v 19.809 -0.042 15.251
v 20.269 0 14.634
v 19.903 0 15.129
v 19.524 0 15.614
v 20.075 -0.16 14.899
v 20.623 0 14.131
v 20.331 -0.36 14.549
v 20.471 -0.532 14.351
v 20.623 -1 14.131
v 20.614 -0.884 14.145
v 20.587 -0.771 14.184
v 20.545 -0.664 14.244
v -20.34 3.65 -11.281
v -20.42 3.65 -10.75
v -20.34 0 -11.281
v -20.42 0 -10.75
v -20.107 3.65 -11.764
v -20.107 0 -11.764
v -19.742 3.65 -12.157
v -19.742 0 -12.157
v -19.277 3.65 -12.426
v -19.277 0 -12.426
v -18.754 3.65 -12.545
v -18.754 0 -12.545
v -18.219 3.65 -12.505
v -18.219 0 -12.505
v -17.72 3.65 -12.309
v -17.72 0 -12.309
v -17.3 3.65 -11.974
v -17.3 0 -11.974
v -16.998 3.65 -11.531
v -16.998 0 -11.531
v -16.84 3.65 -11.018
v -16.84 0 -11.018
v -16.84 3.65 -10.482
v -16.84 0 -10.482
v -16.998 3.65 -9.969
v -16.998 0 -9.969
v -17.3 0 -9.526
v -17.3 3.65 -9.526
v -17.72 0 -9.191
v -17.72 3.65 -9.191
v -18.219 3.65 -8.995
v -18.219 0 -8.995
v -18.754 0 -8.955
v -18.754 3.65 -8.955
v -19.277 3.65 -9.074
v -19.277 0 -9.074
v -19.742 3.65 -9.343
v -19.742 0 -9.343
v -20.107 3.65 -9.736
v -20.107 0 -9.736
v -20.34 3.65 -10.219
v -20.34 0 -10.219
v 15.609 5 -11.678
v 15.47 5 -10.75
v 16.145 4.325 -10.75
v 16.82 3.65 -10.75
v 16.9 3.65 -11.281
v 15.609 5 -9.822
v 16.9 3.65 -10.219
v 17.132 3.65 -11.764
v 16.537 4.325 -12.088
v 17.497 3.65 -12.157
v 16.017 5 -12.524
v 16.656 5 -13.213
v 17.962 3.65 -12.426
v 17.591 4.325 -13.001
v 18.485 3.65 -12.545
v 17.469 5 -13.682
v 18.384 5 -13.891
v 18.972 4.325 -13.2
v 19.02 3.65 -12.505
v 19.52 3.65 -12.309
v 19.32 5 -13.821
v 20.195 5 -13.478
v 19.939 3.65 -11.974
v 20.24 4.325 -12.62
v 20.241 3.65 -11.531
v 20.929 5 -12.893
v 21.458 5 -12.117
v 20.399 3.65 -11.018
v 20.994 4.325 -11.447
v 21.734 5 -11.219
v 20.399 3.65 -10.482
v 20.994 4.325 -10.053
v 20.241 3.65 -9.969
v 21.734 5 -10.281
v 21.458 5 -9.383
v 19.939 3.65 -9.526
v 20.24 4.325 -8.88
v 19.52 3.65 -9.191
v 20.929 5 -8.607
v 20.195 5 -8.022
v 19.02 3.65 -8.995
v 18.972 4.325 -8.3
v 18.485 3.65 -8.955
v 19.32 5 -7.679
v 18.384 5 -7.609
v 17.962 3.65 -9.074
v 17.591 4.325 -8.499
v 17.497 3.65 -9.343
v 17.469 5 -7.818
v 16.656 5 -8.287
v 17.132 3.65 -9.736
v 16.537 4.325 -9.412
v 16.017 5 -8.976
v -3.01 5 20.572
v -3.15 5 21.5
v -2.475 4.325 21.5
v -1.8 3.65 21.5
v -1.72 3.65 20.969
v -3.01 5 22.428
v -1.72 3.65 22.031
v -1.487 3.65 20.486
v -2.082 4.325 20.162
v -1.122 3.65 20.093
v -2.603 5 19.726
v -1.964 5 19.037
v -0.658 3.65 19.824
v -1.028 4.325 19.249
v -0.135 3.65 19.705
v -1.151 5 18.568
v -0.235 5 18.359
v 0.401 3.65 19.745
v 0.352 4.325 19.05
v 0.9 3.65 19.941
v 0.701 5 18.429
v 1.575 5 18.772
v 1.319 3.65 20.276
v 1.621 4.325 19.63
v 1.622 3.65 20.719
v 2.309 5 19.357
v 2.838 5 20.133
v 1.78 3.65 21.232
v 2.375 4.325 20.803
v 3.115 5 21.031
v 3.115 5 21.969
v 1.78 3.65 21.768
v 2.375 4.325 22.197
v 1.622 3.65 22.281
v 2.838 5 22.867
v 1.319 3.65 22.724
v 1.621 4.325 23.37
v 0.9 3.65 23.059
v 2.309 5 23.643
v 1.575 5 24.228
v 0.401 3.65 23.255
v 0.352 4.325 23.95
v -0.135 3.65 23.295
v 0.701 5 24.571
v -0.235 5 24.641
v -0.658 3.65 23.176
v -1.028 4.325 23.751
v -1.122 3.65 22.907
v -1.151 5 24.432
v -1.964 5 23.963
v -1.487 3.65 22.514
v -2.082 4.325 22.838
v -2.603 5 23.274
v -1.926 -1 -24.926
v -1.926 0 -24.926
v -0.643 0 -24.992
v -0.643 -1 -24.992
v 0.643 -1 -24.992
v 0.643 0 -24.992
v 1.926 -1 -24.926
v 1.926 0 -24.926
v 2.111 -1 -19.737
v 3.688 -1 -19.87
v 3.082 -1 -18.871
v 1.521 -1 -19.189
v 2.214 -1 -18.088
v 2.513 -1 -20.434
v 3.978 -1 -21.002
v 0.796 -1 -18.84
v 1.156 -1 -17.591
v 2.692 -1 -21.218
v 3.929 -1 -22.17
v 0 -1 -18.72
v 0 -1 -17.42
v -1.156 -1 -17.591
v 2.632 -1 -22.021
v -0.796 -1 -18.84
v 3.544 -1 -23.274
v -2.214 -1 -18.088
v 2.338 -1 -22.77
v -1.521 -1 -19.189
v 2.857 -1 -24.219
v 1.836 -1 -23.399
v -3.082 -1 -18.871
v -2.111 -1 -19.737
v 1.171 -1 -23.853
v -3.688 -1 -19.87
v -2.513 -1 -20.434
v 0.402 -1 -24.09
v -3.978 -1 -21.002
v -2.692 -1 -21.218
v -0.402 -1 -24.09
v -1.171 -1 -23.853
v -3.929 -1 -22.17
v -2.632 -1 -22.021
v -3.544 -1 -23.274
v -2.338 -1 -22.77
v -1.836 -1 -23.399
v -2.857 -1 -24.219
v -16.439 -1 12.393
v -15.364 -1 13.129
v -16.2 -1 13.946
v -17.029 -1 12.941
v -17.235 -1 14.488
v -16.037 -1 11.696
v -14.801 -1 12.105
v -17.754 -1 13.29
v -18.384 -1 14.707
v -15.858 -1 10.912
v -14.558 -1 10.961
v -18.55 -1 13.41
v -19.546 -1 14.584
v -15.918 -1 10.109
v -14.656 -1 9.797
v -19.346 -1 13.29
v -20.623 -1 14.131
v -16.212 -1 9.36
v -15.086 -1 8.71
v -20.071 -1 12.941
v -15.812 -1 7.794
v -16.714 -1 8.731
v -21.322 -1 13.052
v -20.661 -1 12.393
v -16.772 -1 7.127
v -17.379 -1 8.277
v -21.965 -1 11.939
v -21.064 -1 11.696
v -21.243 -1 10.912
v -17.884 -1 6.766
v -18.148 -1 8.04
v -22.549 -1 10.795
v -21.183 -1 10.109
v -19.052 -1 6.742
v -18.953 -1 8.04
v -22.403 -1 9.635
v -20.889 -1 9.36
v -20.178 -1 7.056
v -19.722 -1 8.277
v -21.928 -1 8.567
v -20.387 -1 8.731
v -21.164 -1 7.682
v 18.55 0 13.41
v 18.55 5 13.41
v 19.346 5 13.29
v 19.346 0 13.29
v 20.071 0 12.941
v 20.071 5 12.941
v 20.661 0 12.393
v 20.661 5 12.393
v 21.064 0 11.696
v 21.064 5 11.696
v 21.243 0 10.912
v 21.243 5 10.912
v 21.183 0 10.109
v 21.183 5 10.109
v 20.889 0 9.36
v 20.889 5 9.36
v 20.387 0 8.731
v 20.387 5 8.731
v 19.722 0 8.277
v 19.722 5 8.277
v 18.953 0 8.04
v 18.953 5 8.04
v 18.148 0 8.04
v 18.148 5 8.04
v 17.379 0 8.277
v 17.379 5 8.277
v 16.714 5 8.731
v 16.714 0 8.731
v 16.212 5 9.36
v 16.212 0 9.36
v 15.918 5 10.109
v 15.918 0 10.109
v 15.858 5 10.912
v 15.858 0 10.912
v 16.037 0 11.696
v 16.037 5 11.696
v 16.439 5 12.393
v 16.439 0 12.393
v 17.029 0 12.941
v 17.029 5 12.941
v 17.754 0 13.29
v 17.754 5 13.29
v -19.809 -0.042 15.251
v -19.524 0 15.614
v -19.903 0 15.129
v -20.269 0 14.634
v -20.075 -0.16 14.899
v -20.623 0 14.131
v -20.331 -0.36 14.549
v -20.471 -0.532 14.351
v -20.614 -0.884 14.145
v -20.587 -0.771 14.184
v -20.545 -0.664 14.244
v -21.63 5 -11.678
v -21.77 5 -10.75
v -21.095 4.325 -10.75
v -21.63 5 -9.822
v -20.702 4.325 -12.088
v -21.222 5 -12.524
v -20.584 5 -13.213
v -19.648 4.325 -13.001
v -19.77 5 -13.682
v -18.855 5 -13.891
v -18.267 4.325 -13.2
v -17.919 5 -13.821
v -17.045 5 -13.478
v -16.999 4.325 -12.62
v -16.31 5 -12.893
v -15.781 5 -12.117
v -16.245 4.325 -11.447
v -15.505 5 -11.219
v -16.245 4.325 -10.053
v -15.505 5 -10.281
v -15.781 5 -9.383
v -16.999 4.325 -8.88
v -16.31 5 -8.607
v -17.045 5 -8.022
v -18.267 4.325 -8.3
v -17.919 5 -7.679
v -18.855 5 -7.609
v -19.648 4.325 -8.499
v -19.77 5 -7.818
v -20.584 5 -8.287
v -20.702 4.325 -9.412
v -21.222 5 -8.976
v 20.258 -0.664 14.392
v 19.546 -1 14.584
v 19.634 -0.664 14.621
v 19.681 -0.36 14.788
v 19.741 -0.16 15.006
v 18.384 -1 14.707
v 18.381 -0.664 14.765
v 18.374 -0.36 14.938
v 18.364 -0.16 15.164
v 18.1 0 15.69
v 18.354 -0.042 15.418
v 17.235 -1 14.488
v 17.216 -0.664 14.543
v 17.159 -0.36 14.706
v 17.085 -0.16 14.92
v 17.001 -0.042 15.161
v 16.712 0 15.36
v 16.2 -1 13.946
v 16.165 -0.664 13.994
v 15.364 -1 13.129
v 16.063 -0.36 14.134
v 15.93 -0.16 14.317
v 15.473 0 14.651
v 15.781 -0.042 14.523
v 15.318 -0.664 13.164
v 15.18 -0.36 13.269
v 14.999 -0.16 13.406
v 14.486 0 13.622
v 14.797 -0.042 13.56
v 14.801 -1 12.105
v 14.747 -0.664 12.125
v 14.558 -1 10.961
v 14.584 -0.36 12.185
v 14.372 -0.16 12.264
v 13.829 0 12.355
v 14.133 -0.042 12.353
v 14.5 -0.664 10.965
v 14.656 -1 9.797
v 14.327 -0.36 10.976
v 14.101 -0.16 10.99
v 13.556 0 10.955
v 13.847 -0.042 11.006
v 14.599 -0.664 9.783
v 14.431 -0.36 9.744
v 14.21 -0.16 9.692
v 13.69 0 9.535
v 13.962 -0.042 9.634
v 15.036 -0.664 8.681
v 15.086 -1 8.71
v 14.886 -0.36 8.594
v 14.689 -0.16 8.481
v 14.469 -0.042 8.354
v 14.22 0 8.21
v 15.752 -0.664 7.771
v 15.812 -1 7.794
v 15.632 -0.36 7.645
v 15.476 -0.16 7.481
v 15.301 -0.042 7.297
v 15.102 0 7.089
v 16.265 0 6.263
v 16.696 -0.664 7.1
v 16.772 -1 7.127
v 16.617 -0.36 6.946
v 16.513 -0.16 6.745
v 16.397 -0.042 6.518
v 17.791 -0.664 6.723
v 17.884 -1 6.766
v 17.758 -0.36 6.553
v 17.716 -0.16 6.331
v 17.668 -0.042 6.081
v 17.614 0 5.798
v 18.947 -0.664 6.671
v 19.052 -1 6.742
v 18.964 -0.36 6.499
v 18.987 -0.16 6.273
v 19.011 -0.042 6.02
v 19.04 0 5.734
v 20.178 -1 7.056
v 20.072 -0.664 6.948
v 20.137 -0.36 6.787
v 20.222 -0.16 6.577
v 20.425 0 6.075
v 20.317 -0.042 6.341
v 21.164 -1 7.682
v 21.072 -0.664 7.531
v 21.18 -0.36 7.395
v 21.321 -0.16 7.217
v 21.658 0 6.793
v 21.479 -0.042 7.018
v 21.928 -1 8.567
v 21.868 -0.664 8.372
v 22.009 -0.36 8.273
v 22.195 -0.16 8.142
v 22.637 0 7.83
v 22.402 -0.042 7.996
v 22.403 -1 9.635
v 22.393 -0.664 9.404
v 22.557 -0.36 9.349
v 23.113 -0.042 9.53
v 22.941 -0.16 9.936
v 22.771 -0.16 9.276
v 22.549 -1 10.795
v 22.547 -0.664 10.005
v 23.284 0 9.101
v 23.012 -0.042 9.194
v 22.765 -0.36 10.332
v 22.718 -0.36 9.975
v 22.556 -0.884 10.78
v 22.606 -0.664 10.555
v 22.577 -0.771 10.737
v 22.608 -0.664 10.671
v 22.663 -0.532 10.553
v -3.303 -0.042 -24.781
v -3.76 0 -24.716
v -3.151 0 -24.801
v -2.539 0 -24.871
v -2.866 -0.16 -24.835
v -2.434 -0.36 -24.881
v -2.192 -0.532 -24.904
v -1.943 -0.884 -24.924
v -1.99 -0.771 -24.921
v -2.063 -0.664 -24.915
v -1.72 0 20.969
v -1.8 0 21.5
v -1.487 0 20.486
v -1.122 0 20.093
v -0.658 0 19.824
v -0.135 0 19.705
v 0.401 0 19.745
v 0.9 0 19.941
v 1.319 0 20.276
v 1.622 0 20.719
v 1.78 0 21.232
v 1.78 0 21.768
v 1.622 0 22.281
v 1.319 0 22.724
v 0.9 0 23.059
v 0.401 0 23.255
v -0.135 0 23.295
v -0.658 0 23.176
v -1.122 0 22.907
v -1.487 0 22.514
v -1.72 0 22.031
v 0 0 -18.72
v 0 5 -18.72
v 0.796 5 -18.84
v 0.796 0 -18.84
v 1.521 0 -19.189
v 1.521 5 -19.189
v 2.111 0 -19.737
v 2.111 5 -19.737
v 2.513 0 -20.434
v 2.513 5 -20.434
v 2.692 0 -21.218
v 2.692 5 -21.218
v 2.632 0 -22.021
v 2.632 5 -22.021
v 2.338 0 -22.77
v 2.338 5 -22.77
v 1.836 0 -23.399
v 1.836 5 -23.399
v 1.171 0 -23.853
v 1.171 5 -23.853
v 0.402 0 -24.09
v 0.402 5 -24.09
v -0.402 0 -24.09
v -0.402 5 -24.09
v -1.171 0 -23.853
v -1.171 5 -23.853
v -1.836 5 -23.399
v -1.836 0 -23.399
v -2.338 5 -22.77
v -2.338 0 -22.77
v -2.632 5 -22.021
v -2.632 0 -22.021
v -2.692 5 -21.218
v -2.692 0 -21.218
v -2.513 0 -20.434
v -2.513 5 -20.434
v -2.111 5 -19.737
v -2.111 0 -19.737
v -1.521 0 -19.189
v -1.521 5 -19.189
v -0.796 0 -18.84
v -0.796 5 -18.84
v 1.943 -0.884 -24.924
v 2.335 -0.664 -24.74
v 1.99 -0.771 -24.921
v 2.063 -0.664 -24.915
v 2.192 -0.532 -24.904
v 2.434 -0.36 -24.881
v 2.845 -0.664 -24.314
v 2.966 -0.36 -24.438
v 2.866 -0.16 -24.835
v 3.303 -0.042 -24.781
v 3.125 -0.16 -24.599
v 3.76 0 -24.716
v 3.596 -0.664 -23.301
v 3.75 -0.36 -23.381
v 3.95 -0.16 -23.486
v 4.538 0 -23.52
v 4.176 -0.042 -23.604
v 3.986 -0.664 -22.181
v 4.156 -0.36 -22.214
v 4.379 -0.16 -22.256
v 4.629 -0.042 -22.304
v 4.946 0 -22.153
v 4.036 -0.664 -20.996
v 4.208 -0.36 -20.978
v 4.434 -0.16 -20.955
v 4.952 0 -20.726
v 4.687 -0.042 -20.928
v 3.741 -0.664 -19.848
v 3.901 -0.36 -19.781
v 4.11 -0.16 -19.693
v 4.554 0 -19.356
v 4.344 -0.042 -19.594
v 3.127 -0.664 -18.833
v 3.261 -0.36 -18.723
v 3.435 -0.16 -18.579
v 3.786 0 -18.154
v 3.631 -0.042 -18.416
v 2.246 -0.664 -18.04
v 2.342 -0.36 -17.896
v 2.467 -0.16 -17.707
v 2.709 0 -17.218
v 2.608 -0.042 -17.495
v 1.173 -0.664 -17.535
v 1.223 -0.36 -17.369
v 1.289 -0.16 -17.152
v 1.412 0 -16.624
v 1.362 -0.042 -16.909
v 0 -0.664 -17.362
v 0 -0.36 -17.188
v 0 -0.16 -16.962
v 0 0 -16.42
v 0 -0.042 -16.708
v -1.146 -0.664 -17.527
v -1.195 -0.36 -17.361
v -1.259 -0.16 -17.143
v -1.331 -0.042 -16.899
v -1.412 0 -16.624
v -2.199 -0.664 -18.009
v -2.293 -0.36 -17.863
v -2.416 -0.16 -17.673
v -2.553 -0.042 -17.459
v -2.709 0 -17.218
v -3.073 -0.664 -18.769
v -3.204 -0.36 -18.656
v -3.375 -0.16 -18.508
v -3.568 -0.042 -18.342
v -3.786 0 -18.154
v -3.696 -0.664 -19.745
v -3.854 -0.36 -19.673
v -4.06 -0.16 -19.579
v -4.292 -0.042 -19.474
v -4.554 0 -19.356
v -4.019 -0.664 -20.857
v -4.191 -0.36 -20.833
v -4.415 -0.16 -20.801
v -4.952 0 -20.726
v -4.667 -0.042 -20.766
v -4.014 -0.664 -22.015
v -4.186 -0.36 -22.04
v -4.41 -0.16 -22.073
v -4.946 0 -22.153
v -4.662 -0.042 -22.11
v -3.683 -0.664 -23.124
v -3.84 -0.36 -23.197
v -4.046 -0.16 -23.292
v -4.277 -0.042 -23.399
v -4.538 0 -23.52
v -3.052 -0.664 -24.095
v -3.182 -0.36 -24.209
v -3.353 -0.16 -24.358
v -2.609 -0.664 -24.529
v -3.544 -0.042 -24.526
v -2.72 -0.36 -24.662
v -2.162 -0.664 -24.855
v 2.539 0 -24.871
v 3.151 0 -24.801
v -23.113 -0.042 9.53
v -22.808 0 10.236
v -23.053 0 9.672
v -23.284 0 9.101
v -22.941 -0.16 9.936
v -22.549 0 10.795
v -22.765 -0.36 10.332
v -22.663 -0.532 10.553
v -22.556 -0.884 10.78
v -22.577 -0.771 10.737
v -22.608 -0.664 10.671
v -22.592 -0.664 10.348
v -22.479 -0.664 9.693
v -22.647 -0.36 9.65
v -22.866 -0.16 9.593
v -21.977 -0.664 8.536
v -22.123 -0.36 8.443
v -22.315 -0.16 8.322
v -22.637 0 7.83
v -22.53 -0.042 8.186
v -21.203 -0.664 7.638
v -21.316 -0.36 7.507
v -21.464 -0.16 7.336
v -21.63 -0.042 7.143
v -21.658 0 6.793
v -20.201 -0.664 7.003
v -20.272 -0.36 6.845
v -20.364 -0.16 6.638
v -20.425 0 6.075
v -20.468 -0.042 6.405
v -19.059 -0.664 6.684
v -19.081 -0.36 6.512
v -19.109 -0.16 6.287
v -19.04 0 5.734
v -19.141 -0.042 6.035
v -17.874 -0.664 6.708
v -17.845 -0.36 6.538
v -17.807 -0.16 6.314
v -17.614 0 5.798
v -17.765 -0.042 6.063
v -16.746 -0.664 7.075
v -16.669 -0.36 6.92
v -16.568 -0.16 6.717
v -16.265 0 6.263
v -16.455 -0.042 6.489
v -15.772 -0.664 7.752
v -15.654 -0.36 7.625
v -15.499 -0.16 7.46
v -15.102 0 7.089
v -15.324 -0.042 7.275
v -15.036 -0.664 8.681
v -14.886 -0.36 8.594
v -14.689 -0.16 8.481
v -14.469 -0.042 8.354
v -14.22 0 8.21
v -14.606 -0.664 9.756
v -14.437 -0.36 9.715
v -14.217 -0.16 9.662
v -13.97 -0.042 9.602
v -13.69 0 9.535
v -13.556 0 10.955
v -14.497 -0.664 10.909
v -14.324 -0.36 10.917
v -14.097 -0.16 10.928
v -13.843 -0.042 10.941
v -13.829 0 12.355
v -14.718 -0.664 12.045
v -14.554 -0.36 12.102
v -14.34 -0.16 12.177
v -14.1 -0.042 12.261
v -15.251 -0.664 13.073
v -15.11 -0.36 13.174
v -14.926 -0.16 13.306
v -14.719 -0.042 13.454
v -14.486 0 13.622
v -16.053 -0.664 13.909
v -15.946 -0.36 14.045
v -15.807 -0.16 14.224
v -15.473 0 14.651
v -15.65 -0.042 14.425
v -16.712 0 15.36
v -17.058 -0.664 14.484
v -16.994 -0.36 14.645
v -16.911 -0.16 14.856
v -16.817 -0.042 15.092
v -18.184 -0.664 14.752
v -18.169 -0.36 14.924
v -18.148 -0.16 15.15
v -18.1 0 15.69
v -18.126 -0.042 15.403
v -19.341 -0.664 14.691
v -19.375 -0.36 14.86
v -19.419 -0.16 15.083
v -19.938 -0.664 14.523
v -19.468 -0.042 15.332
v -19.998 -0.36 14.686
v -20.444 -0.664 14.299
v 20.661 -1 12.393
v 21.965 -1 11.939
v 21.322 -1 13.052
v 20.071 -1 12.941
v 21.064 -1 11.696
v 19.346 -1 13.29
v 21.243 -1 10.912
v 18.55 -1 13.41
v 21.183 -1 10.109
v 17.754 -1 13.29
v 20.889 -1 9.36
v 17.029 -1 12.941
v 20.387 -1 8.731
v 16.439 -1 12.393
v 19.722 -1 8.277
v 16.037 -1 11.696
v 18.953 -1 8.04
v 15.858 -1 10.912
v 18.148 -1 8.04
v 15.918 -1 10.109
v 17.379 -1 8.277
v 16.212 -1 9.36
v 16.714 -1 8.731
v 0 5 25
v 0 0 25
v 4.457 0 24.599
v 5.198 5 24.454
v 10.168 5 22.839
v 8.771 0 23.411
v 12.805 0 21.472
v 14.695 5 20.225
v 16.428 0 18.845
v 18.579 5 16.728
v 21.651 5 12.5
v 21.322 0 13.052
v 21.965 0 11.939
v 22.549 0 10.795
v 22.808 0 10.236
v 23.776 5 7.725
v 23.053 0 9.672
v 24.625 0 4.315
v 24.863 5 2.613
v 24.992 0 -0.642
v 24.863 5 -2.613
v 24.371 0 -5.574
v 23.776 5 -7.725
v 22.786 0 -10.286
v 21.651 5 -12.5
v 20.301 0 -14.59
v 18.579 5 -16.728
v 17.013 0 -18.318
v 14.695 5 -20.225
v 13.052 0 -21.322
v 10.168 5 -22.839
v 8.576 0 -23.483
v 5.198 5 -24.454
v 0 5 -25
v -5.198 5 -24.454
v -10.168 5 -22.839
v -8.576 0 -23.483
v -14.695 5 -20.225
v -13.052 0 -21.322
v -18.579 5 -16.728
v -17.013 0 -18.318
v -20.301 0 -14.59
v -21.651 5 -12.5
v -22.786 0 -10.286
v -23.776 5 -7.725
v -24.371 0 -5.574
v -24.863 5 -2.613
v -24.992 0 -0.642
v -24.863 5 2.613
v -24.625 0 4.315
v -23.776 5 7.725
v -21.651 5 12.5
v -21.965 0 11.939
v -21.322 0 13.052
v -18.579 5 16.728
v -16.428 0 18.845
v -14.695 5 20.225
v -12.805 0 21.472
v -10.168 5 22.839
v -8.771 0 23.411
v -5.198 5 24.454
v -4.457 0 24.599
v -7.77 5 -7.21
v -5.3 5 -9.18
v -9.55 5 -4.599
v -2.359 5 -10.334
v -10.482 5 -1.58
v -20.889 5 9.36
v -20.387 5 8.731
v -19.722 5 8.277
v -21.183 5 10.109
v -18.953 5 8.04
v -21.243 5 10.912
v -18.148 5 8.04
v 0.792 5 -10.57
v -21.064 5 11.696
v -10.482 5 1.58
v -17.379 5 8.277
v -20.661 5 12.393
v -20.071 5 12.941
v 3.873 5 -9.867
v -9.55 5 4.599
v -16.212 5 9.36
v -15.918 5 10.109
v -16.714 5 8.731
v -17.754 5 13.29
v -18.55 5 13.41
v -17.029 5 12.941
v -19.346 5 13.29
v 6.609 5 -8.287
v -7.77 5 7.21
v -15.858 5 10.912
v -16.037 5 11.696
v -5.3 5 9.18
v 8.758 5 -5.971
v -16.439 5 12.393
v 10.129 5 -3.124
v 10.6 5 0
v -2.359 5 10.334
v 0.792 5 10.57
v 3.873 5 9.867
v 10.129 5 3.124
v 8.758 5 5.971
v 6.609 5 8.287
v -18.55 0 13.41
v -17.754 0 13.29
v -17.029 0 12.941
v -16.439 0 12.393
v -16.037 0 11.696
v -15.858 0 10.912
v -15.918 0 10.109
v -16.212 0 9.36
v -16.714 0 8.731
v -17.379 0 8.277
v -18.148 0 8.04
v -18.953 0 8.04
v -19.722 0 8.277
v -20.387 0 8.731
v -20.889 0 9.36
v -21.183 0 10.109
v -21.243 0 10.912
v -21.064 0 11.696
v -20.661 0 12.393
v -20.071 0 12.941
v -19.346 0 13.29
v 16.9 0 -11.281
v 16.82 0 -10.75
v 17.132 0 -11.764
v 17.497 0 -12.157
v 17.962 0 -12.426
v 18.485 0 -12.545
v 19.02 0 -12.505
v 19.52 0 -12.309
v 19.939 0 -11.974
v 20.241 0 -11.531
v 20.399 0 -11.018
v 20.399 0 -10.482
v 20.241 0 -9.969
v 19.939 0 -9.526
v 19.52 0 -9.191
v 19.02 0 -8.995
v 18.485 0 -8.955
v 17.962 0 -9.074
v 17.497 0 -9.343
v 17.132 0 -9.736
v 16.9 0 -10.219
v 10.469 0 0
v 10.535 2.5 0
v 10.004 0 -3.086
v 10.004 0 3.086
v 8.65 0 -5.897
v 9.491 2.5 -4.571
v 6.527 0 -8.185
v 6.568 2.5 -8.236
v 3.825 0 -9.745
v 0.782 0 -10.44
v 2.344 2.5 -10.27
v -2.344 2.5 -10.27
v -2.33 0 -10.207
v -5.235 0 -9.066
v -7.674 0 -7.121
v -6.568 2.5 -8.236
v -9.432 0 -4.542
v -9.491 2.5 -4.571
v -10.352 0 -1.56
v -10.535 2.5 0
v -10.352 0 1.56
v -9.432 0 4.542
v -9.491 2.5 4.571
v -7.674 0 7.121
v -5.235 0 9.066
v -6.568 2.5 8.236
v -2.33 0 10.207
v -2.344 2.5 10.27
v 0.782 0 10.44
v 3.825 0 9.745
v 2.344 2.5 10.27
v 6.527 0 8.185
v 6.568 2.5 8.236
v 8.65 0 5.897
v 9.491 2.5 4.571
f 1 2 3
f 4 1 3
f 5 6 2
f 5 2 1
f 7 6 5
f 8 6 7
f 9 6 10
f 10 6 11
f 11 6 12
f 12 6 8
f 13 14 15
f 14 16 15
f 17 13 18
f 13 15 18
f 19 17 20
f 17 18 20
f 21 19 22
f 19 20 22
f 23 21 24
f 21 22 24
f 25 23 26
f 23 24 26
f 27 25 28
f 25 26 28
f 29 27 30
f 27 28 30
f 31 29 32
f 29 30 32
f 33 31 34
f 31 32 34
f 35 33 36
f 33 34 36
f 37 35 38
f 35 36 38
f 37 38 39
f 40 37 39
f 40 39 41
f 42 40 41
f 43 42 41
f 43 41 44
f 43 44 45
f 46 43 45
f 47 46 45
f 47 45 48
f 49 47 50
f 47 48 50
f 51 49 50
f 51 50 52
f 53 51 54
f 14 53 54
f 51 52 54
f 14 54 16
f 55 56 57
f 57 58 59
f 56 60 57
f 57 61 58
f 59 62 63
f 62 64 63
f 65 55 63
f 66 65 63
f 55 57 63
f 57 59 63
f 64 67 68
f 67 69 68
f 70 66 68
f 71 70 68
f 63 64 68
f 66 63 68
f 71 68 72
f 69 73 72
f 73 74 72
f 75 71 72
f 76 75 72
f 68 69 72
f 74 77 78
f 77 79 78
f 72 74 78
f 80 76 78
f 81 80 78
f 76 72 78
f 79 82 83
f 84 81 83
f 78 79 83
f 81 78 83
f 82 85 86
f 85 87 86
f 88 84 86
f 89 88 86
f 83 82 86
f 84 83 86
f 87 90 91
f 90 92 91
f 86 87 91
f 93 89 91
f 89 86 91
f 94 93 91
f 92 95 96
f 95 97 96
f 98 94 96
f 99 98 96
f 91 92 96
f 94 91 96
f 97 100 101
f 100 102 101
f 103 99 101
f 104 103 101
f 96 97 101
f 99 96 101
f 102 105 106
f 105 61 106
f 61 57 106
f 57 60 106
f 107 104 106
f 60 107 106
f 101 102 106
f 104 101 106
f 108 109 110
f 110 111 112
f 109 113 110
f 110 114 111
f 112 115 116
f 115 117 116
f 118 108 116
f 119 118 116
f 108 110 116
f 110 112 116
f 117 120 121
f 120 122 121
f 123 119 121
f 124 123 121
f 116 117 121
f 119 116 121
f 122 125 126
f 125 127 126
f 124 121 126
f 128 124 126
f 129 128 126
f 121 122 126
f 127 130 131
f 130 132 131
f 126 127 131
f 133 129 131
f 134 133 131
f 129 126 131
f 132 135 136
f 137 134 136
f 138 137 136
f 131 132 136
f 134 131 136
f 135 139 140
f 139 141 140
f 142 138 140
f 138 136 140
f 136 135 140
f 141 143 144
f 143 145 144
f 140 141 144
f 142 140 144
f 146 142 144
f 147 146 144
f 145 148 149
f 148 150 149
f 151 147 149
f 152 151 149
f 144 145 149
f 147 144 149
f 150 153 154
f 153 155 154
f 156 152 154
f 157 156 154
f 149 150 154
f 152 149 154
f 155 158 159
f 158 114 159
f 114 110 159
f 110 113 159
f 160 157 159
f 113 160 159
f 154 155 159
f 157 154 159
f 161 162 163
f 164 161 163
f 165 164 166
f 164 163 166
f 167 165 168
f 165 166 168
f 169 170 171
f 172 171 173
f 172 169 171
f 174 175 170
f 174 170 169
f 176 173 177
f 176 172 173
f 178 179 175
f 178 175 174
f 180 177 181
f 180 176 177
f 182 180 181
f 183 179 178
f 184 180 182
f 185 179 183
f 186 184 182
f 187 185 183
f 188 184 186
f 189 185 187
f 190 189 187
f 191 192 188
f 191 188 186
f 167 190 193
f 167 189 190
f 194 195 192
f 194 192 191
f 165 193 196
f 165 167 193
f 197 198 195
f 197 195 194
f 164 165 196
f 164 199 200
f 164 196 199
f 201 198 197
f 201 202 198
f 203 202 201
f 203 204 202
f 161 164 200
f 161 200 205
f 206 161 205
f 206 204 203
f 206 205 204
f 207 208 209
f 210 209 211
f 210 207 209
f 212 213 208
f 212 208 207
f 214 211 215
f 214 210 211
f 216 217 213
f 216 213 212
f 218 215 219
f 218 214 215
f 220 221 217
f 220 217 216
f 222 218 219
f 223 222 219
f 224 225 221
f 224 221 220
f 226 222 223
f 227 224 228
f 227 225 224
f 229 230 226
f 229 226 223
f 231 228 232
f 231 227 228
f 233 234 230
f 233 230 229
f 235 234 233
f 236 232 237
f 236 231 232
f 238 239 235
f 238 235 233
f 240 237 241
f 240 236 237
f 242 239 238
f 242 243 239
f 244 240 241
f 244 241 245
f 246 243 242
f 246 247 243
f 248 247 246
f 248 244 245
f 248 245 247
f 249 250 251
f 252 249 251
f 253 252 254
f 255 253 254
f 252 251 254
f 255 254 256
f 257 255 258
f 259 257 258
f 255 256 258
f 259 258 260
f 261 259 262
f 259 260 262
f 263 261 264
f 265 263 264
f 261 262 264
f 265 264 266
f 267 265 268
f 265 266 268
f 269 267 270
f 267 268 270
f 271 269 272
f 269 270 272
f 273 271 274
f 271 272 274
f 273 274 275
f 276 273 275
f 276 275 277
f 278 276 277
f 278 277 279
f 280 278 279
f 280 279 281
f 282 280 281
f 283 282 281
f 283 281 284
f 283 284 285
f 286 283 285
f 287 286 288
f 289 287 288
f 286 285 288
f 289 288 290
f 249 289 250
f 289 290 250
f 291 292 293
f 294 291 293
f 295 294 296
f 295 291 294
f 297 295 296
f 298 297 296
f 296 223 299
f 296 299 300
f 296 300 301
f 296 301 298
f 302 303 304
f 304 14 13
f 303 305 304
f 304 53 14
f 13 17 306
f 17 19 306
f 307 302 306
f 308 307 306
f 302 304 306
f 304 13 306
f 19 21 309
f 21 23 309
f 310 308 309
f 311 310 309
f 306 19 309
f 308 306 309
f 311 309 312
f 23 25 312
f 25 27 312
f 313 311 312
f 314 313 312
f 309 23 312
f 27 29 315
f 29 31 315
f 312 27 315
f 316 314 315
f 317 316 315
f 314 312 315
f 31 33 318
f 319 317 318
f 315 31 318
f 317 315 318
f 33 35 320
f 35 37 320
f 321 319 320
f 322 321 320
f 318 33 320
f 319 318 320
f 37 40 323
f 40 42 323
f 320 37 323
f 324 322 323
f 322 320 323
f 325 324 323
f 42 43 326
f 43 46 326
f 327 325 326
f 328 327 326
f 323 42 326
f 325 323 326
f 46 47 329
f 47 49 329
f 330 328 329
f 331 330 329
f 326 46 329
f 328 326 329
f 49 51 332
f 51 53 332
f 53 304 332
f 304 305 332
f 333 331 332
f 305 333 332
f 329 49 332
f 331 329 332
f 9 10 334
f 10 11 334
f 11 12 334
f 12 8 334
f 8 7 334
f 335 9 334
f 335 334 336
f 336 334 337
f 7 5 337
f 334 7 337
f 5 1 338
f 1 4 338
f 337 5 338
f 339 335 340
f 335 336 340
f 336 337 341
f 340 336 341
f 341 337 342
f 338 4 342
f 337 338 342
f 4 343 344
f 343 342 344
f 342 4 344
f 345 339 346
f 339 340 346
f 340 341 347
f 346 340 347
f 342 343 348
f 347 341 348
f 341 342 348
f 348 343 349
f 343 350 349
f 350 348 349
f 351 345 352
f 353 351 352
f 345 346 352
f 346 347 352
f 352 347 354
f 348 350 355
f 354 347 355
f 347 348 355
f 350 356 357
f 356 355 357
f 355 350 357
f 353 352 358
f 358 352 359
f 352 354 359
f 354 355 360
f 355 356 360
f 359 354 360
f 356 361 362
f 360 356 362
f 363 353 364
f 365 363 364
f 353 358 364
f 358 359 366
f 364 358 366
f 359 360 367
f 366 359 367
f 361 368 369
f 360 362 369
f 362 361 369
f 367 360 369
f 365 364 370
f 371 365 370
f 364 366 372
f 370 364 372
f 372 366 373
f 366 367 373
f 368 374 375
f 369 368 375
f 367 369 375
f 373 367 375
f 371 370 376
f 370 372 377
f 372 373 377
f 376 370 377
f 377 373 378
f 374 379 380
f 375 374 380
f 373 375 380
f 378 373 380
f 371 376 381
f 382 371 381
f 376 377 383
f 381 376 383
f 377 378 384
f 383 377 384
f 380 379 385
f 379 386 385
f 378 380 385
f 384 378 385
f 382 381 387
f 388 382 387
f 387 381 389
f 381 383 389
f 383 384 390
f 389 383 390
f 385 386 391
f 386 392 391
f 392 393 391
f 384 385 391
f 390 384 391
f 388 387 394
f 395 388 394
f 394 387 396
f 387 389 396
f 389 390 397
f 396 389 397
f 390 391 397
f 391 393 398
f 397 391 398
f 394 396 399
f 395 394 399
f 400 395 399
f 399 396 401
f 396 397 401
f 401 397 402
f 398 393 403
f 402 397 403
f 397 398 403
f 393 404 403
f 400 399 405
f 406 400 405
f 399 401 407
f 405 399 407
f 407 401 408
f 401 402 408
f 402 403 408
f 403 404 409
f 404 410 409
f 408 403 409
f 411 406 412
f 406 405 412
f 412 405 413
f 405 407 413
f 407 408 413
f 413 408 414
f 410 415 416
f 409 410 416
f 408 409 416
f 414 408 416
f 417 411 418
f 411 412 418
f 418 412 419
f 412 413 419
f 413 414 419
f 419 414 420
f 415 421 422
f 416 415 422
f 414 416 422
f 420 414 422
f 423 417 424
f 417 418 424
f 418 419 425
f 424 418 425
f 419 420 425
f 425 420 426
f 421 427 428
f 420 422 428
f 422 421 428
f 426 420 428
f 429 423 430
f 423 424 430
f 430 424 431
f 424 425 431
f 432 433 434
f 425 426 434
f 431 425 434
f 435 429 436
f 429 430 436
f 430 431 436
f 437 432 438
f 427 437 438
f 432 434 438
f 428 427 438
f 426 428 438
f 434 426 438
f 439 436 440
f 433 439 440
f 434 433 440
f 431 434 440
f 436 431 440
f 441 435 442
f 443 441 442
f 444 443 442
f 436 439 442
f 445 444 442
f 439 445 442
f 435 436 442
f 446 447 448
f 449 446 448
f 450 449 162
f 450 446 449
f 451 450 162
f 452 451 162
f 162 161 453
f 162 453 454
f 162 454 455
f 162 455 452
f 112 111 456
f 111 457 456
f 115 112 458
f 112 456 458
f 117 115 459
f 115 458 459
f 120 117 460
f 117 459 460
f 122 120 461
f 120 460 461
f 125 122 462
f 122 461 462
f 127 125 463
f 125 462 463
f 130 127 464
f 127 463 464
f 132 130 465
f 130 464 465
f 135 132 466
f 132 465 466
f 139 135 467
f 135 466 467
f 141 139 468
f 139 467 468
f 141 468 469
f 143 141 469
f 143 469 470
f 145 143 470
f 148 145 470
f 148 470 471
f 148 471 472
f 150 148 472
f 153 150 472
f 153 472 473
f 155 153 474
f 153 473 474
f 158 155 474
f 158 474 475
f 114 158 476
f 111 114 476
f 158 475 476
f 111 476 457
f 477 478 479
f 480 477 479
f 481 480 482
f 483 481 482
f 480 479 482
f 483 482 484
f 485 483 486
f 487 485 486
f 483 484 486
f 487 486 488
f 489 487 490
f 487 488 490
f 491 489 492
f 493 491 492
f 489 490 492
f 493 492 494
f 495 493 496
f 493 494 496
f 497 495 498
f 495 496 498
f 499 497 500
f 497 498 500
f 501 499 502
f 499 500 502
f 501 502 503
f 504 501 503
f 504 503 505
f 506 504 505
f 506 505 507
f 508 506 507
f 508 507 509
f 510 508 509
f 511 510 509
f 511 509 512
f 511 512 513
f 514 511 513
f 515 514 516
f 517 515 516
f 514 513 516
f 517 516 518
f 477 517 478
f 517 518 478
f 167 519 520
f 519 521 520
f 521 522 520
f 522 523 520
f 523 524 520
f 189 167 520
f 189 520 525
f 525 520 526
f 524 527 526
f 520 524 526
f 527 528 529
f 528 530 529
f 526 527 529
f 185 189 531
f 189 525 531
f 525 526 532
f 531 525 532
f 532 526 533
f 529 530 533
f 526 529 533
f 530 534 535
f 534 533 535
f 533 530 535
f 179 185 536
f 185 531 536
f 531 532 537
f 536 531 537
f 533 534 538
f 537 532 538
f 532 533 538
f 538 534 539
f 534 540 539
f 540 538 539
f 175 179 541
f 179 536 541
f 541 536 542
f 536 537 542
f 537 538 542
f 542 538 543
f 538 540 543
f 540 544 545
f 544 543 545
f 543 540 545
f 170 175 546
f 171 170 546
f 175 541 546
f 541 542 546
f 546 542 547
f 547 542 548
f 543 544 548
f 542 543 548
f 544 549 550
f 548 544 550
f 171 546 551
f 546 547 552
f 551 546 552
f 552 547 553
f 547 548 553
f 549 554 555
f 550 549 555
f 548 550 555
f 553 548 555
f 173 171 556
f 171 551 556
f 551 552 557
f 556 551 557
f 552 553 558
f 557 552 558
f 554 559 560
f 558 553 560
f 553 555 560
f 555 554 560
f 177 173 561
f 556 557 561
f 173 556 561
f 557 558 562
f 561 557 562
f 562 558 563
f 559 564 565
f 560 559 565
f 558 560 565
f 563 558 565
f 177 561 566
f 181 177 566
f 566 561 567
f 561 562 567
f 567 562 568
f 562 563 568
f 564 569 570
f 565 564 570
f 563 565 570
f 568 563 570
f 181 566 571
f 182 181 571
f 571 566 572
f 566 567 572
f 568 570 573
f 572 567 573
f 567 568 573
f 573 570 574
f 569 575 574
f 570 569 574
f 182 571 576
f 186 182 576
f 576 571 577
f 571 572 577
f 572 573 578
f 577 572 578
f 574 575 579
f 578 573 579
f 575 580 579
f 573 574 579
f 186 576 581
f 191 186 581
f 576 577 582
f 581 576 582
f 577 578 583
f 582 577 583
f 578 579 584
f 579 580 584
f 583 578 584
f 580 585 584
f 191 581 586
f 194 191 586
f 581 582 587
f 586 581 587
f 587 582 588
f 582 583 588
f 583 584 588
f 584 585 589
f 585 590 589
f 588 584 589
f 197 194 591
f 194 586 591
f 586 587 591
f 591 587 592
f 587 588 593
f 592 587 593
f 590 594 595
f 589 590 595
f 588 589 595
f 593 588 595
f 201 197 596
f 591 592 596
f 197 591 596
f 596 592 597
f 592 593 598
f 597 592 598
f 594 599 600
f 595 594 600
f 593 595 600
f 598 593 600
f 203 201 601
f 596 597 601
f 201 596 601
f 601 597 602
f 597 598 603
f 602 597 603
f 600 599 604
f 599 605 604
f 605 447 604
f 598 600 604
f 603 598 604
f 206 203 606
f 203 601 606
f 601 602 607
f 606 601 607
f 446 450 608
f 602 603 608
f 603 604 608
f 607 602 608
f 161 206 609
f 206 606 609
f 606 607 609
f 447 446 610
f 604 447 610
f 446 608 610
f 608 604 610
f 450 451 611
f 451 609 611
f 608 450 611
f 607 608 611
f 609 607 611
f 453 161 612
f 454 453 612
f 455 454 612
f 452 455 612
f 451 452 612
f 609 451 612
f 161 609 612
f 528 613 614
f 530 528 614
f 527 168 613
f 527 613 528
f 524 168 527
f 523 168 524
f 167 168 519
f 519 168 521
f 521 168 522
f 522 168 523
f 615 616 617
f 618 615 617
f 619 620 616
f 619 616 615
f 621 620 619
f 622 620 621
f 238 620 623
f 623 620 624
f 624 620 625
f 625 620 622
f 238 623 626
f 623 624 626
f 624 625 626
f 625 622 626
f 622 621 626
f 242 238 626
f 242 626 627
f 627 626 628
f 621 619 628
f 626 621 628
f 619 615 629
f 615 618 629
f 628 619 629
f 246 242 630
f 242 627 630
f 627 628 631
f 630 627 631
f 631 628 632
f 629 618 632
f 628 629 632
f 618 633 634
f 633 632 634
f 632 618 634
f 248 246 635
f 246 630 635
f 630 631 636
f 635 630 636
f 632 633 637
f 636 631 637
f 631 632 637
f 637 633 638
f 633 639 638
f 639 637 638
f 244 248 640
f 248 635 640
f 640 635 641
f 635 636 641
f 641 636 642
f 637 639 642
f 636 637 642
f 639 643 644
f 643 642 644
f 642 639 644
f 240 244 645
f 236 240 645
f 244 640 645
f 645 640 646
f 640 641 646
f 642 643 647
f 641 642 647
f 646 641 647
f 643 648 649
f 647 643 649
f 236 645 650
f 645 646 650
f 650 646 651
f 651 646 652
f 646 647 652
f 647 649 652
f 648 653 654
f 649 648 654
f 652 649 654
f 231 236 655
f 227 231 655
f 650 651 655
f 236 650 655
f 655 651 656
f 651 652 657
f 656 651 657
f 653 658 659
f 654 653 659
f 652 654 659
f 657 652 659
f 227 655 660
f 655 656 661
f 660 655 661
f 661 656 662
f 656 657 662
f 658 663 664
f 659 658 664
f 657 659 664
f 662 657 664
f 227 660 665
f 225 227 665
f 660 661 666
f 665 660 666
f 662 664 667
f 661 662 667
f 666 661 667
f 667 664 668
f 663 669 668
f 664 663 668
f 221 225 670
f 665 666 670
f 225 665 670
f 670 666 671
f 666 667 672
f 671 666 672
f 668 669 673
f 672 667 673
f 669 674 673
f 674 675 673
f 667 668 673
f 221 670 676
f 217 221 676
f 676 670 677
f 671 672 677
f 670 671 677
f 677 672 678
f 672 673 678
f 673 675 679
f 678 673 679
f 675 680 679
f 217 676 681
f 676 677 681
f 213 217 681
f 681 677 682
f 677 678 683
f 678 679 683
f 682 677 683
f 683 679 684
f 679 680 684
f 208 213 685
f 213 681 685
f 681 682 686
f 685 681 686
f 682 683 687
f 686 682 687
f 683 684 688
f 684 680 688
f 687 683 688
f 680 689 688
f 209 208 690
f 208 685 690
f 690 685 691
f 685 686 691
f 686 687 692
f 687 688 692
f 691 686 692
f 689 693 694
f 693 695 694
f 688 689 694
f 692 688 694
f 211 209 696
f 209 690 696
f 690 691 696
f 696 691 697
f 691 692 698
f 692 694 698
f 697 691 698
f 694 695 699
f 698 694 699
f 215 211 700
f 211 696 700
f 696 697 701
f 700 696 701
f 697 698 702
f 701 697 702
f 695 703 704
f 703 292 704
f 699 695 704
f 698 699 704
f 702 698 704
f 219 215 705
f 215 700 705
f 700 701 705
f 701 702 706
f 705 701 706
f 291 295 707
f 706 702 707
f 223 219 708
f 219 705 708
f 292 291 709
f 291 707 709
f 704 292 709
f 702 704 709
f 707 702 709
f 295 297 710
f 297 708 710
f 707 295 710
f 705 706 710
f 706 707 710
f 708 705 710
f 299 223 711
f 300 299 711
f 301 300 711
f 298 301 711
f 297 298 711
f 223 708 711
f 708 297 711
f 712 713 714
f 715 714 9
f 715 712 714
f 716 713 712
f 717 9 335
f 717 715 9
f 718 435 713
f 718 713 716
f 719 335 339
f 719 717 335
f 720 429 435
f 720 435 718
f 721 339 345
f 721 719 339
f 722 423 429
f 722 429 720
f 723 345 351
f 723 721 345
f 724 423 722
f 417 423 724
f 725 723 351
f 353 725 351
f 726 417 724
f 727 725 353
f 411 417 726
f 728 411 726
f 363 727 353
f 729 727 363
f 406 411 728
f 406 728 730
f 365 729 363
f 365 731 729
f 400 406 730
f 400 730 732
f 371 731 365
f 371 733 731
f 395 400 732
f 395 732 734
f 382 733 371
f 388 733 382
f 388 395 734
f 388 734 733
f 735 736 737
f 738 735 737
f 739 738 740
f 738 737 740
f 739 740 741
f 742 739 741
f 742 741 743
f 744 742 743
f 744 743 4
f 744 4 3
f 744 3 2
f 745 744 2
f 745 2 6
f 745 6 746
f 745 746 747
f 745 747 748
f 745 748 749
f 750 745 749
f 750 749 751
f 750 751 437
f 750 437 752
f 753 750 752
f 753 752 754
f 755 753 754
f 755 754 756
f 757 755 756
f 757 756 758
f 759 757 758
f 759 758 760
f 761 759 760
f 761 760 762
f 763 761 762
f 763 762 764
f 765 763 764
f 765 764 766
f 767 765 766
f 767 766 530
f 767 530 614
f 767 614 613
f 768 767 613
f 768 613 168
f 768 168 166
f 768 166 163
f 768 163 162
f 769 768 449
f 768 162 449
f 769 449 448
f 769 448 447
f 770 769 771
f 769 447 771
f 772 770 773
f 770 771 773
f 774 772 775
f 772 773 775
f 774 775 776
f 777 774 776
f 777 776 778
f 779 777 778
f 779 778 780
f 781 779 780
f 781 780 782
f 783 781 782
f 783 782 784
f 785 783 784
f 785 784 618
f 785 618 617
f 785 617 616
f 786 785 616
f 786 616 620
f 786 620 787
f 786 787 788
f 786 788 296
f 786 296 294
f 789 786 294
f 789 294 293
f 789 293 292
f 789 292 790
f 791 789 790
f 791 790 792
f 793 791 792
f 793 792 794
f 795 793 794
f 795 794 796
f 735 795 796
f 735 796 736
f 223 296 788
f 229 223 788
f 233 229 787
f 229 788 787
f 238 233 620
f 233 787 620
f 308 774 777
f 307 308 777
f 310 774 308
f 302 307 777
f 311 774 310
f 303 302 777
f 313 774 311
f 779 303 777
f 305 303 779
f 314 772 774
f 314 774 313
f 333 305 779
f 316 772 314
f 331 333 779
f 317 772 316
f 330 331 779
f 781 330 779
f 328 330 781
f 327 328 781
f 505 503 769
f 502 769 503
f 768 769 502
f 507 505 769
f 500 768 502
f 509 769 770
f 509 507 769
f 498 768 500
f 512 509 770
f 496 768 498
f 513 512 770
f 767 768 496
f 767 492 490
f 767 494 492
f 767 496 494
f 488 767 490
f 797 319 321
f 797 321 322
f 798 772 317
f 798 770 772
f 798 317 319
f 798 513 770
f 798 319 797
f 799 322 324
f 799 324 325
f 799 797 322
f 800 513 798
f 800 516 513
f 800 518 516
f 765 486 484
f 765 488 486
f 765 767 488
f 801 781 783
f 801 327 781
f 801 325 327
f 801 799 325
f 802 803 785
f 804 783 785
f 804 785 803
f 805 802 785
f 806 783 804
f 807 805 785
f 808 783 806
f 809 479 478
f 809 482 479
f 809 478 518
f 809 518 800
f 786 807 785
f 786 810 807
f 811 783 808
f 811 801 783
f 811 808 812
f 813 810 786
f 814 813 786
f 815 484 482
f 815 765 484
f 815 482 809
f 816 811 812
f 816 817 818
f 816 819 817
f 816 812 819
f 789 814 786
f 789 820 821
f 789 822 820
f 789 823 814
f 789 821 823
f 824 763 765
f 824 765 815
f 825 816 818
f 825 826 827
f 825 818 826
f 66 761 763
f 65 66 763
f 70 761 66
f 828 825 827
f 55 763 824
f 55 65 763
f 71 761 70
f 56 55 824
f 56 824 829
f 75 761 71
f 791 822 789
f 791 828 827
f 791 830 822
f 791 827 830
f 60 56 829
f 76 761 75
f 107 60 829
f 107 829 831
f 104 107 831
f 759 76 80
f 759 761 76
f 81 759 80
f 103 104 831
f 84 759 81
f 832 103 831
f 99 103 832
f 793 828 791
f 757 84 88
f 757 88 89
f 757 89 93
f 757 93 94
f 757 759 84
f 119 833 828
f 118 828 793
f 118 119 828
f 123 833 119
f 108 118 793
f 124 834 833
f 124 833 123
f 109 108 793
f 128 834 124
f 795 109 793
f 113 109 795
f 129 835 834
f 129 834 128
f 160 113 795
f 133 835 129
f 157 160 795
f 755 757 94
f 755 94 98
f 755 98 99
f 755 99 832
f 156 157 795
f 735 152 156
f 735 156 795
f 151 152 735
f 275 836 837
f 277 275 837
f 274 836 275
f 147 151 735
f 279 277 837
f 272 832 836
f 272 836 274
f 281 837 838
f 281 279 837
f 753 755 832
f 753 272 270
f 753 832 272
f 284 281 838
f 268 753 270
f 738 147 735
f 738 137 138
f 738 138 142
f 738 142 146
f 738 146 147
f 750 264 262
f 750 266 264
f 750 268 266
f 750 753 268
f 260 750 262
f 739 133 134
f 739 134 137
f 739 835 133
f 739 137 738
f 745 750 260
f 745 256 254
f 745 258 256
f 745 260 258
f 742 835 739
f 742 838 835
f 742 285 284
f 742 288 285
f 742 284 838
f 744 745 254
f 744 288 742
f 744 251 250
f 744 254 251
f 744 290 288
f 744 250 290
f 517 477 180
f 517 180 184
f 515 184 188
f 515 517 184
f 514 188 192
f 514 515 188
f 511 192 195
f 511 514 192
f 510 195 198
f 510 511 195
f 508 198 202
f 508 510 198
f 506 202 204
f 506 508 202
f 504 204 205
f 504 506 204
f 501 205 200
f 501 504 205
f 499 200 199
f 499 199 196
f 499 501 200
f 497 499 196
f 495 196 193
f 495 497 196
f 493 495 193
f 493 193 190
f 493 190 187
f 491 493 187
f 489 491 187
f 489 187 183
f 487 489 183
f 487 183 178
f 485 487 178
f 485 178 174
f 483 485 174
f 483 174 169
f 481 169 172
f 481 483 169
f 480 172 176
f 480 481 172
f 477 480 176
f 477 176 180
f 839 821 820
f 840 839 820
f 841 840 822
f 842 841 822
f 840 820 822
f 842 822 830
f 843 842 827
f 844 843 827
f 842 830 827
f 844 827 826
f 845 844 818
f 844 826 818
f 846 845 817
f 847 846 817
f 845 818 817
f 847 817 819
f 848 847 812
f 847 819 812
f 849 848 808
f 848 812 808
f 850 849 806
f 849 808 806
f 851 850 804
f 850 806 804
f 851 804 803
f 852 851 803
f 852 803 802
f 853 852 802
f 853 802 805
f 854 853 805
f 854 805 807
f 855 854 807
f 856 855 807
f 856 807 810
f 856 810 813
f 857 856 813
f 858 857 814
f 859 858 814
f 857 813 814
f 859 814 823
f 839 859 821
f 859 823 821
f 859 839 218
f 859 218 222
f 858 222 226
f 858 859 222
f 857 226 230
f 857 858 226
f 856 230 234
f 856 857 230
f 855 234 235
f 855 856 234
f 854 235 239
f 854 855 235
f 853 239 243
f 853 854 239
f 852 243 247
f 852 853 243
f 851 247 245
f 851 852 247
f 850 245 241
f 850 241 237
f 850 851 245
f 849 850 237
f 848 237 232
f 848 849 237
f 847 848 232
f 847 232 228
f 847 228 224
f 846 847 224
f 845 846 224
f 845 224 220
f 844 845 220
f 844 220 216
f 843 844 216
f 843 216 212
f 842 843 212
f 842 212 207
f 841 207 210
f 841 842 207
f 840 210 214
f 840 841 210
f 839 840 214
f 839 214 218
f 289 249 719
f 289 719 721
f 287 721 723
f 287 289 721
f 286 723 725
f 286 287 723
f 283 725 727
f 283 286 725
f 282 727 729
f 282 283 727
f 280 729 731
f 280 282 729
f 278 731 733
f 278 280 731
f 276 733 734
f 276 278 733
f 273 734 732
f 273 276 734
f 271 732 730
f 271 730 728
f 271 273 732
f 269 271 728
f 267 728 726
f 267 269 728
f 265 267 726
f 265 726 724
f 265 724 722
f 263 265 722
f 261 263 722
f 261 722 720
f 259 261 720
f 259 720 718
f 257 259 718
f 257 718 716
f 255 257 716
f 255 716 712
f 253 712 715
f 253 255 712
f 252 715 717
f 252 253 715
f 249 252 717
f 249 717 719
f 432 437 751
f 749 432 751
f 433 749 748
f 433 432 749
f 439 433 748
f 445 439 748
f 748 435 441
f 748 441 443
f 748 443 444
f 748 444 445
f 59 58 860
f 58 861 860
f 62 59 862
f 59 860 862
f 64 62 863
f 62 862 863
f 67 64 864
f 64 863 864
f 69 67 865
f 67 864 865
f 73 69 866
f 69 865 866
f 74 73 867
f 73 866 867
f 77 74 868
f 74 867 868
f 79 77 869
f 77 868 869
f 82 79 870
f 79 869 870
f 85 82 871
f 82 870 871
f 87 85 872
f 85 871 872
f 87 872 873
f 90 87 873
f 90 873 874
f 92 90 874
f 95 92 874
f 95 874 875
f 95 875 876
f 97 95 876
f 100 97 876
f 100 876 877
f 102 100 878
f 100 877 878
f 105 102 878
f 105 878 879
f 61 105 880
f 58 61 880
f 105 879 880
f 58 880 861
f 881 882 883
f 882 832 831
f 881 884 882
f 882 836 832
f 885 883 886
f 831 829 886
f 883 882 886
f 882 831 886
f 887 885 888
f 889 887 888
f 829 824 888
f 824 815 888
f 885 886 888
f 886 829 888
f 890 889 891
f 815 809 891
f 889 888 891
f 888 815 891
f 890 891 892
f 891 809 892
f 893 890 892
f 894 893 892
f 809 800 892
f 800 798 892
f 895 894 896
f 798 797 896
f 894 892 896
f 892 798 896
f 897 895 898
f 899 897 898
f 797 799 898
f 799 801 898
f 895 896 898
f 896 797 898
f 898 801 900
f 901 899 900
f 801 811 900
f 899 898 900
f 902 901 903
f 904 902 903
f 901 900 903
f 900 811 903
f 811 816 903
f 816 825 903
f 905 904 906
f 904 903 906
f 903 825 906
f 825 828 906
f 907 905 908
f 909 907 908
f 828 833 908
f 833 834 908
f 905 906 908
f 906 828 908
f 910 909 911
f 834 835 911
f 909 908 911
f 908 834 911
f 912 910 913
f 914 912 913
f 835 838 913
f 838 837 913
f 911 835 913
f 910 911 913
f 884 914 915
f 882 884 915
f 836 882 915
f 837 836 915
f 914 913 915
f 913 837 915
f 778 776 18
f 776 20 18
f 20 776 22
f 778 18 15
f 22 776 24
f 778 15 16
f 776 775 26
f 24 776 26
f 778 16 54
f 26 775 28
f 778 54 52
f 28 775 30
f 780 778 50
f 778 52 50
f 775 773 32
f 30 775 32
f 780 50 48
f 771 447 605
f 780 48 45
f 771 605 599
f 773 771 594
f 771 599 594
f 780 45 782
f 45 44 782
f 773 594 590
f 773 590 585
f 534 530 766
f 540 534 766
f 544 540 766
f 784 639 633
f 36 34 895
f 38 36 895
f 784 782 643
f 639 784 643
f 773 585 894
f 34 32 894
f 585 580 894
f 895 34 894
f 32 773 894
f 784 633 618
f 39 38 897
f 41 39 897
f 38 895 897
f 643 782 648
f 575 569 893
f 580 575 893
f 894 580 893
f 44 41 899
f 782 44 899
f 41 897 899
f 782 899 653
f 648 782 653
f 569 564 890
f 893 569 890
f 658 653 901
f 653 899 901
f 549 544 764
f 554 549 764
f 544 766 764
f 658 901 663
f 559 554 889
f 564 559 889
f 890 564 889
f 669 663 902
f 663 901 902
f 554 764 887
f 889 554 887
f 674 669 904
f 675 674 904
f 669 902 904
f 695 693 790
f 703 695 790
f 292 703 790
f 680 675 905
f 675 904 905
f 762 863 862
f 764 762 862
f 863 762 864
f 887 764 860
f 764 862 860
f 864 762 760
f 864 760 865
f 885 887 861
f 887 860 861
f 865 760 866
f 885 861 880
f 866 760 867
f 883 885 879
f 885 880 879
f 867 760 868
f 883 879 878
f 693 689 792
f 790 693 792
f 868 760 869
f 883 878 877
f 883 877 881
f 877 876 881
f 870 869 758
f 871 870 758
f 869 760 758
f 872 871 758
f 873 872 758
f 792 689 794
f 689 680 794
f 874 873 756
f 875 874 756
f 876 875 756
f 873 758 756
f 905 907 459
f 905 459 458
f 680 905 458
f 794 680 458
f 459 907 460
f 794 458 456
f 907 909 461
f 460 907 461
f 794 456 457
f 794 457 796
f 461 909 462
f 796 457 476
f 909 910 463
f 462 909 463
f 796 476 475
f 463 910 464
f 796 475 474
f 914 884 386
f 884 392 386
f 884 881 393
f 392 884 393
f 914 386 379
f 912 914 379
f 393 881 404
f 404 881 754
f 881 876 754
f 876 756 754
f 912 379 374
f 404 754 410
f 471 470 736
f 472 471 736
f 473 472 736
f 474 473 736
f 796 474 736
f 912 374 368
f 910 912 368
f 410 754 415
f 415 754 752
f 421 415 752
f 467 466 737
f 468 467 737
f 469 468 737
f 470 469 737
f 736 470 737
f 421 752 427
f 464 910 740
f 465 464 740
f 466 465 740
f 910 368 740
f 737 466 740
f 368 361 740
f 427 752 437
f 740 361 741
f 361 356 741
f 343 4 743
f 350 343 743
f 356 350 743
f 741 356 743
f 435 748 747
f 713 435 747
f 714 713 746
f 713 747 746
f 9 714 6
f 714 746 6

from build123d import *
from build123d.topology import SkipClean

# Parameters (mm, degrees)
CROQUIS1_R                                           = 25
SALIENTE_EXTRUIR1_DEPTH                              = 5
CROQUIS2_R                                           = 2.7
CORTAR_EXTRUIR2_DEPTH                                = 5
CROQUIS3_R                                           = 1.45
CORTAR_EXTRUIR3_DEPTH                                = 5
CROQUIS4_R                                           = 10.6
CORTAR_EXTRUIR4_DEPTH                                = 5
CORTAR_EXTRUIR4_DRAFT                                = -1.5
AVELLANADO_PARA_TORNILLO_CON_CABEZA_PLAN_D           = 3.6
AVELLANADO_PARA_TORNILLO_CON_CABEZA_PLAN_CSINK_D     = 6.3
AVELLANADO_PARA_TORNILLO_CON_CABEZA_PLAN_CSINK_ANGLE = 90
CROQUIS7_R                                           = 2.7
SALIENTE_EXTRUIR2_DEPTH                              = 1
REDONDEO1_R                                          = 1


with BuildPart() as part:
    # Croquis1 → Saliente-Extruir1 (new body)
    with BuildSketch(Plane(origin=(0, 0, 0), x_dir=(1, 0, 0), z_dir=(0, 1, 0))):
        with Locations(Location((0, 0, 0), (0, 0, 270))):
            Circle(CROQUIS1_R)
    extrude(amount=SALIENTE_EXTRUIR1_DEPTH)

    # Croquis2 → Cortar-Extruir2 (cut)
    with BuildSketch(Plane(origin=(0, 5, 0), x_dir=(1, 0, 0), z_dir=(0, 1, 0))):
        with Locations(Location((0, 21.42, 0), (0, 0, 270))):
            Circle(CROQUIS2_R)
        with Locations(Location((18.550264149, -10.71, 0), (0, 0, 270))):
            Circle(CROQUIS2_R)
        with Locations(Location((-18.550264149, -10.71, 0), (0, 0, 270))):
            Circle(CROQUIS2_R)
    extrude(amount=-CORTAR_EXTRUIR2_DEPTH, mode=Mode.SUBTRACT)

    # Croquis3 → Cortar-Extruir3 (cut)
    with BuildSketch(Plane(origin=(0, 5, 0), x_dir=(1, 0, 0), z_dir=(0, 1, 0))):
        with Locations(Location((0, -21.5, 0), (0, 0, 270))):
            Circle(CROQUIS3_R)
        with Locations(Location((-18.619546181, 10.75, 0), (0, 0, 270))):
            Circle(CROQUIS3_R)
        with Locations(Location((18.619546181, 10.75, 0), (0, 0, 270))):
            Circle(CROQUIS3_R)
    extrude(amount=-CORTAR_EXTRUIR3_DEPTH, mode=Mode.SUBTRACT)


with BuildPart() as cortar_extruir4_tool:
    # Croquis4 → Cortar-Extruir4 (with draft: the straight prism first)
    with BuildSketch(Plane(origin=(0, 5, 0), x_dir=(1, 0, 0), z_dir=(0, 1, 0))):
        Circle(CROQUIS4_R)
    extrude(amount=-CORTAR_EXTRUIR4_DEPTH)
    # Cortar-Extruir4: the draft: its side faces are tilted about the plane it starts from
    cortar_extruir4_sides = [cortar_extruir4_tool.faces().sort_by_distance(p)[0] for p in [
        (-10.6, 2.5, 0),
    ]]
    draft(cortar_extruir4_sides, Plane(origin=(0, 5, 0), x_dir=(1, 0, 0), z_dir=(0, 1, 0)), CORTAR_EXTRUIR4_DRAFT)


with BuildPart() as part_1:
    add(part.part)

    # Cortar-Extruir4: cut by cortar_extruir4_tool
    add(cortar_extruir4_tool.part, mode=Mode.SUBTRACT)

    # Avellanado para tornillo con cabeza plana de M31 (through all)
    with Locations(Plane(origin=(0, 5, 0), x_dir=(1, 0, 0), z_dir=(0, 1, 0))):
        with Locations((-18.619546181, 10.75), (18.619546181, 10.75), (0, -21.5)):
            CounterSinkHole(AVELLANADO_PARA_TORNILLO_CON_CABEZA_PLAN_D / 2, AVELLANADO_PARA_TORNILLO_CON_CABEZA_PLAN_CSINK_D / 2, counter_sink_angle=AVELLANADO_PARA_TORNILLO_CON_CABEZA_PLAN_CSINK_ANGLE)

    # Croquis7 → Saliente-Extruir2 (add)
    # profile 1 of 3: a face of its own
    with SkipClean():  # the faces are left unmerged after this step: merging them gives an invalid solid
        with BuildSketch(Plane(origin=(0, 0, 0), x_dir=(-1, 0, 0), z_dir=(0, -1, 0))):
            with BuildLine():
                ThreePointArc((22.549366787, -10.794723595), (15.086162534, -8.71), (20.623188254, -14.13096268))
                ThreePointArc((20.623188254, -14.13096268), (21.650635095, -12.5), (22.549366787, -10.794723595))
            make_face()
            with Locations(Location((18.550264149, -10.71, 0), (0, 0, 270))):
                Circle(CROQUIS7_R, mode=Mode.SUBTRACT)
        # profile 2 of 3: a face of its own
        with BuildSketch(Plane(origin=(0, 0, 0), x_dir=(-1, 0, 0), z_dir=(0, -1, 0))):
            with BuildLine():
                ThreePointArc((-20.623188254, -14.13096268), (-15.086162534, -8.71), (-22.549366787, -10.794723595))
                ThreePointArc((-22.549366787, -10.794723595), (-21.650635095, -12.5), (-20.623188254, -14.13096268))
            make_face()
            with Locations(Location((-18.550264149, -10.71, 0), (0, 0, 270))):
                Circle(CROQUIS7_R, mode=Mode.SUBTRACT)
        # profile 3 of 3: a face of its own
        with BuildSketch(Plane(origin=(0, 0, 0), x_dir=(-1, 0, 0), z_dir=(0, -1, 0))):
            with BuildLine():
                ThreePointArc((-1.926178534, 24.925686275), (0, 17.42), (1.926178534, 24.925686275))
                ThreePointArc((1.926178534, 24.925686275), (0, 25), (-1.926178534, 24.925686275))
            make_face()
            with Locations(Location((0, 21.42, 0), (0, 0, 270))):
                Circle(CROQUIS7_R, mode=Mode.SUBTRACT)
        extrude(amount=SALIENTE_EXTRUIR2_DEPTH)

    # Redondeo1
    # the kernel refuses this fillet: 1 mm, written as the material it adds along each edge
    with BuildSketch(Plane(origin=(0, 0, -21.42), x_dir=(0.0031415874858800596, 0, -0.9999950652018583), z_dir=(-0.9999950652018583, 0, -0.0031415874858800596))) as redondeo1_piece_1_section:
        with BuildLine():
            CenterArc((4 + REDONDEO1_R, REDONDEO1_R), REDONDEO1_R, 180, 90)
            Line((4, REDONDEO1_R), (4, 0))
            Line((4, 0), (4 + REDONDEO1_R, 0))
        make_face()
    redondeo1_piece_1 = revolve(axis=Axis((0, 0, -21.42), (0, -1, 0)), revolution_arc=359.64, mode=Mode.PRIVATE)
    redondeo1_piece_1 = redondeo1_piece_1 & Plane(origin=(0, -0.280437839, 0), x_dir=(0, 0, 1), z_dir=(0, -1, 0)) * Cylinder(25, 21, mode=Mode.PRIVATE)
    add(redondeo1_piece_1)
    with BuildSketch(Plane(origin=(18.550264149, 0, 10.71), x_dir=(0.8644503363809782, 0, 0.5027182271718559), z_dir=(0.5027182271718559, 0, -0.8644503363809782))) as redondeo1_piece_2_section:
        with BuildLine():
            CenterArc((4 + REDONDEO1_R, REDONDEO1_R), REDONDEO1_R, 180, 90)
            Line((4, REDONDEO1_R), (4, 0))
            Line((4, 0), (4 + REDONDEO1_R, 0))
        make_face()
    redondeo1_piece_2 = revolve(axis=Axis((18.550264149, 0, 10.71), (0, -1, 0)), revolution_arc=359.64, mode=Mode.PRIVATE)
    redondeo1_piece_2 = redondeo1_piece_2 & Plane(origin=(0, -0.280437839, 0), x_dir=(0, 0, 1), z_dir=(0, -1, 0)) * Cylinder(25, 21, mode=Mode.PRIVATE)
    add(redondeo1_piece_2)
    with BuildSketch(Plane(origin=(-18.550264149, 0, 10.71), x_dir=(-0.867591923866794, 0, 0.49727683803000045), z_dir=(0.49727683803000045, 0, 0.867591923866794))) as redondeo1_piece_3_section:
        with BuildLine():
            CenterArc((4 + REDONDEO1_R, REDONDEO1_R), REDONDEO1_R, 180, 90)
            Line((4, REDONDEO1_R), (4, 0))
            Line((4, 0), (4 + REDONDEO1_R, 0))
        make_face()
    redondeo1_piece_3 = revolve(axis=Axis((-18.550264149, 0, 10.71), (0, -1, 0)), revolution_arc=359.64, mode=Mode.PRIVATE)
    redondeo1_piece_3 = redondeo1_piece_3 & Plane(origin=(0, -0.280437839, 0), x_dir=(0, 0, 1), z_dir=(0, -1, 0)) * Cylinder(25, 20, mode=Mode.PRIVATE)
    add(redondeo1_piece_3)


solid = part_1.part
